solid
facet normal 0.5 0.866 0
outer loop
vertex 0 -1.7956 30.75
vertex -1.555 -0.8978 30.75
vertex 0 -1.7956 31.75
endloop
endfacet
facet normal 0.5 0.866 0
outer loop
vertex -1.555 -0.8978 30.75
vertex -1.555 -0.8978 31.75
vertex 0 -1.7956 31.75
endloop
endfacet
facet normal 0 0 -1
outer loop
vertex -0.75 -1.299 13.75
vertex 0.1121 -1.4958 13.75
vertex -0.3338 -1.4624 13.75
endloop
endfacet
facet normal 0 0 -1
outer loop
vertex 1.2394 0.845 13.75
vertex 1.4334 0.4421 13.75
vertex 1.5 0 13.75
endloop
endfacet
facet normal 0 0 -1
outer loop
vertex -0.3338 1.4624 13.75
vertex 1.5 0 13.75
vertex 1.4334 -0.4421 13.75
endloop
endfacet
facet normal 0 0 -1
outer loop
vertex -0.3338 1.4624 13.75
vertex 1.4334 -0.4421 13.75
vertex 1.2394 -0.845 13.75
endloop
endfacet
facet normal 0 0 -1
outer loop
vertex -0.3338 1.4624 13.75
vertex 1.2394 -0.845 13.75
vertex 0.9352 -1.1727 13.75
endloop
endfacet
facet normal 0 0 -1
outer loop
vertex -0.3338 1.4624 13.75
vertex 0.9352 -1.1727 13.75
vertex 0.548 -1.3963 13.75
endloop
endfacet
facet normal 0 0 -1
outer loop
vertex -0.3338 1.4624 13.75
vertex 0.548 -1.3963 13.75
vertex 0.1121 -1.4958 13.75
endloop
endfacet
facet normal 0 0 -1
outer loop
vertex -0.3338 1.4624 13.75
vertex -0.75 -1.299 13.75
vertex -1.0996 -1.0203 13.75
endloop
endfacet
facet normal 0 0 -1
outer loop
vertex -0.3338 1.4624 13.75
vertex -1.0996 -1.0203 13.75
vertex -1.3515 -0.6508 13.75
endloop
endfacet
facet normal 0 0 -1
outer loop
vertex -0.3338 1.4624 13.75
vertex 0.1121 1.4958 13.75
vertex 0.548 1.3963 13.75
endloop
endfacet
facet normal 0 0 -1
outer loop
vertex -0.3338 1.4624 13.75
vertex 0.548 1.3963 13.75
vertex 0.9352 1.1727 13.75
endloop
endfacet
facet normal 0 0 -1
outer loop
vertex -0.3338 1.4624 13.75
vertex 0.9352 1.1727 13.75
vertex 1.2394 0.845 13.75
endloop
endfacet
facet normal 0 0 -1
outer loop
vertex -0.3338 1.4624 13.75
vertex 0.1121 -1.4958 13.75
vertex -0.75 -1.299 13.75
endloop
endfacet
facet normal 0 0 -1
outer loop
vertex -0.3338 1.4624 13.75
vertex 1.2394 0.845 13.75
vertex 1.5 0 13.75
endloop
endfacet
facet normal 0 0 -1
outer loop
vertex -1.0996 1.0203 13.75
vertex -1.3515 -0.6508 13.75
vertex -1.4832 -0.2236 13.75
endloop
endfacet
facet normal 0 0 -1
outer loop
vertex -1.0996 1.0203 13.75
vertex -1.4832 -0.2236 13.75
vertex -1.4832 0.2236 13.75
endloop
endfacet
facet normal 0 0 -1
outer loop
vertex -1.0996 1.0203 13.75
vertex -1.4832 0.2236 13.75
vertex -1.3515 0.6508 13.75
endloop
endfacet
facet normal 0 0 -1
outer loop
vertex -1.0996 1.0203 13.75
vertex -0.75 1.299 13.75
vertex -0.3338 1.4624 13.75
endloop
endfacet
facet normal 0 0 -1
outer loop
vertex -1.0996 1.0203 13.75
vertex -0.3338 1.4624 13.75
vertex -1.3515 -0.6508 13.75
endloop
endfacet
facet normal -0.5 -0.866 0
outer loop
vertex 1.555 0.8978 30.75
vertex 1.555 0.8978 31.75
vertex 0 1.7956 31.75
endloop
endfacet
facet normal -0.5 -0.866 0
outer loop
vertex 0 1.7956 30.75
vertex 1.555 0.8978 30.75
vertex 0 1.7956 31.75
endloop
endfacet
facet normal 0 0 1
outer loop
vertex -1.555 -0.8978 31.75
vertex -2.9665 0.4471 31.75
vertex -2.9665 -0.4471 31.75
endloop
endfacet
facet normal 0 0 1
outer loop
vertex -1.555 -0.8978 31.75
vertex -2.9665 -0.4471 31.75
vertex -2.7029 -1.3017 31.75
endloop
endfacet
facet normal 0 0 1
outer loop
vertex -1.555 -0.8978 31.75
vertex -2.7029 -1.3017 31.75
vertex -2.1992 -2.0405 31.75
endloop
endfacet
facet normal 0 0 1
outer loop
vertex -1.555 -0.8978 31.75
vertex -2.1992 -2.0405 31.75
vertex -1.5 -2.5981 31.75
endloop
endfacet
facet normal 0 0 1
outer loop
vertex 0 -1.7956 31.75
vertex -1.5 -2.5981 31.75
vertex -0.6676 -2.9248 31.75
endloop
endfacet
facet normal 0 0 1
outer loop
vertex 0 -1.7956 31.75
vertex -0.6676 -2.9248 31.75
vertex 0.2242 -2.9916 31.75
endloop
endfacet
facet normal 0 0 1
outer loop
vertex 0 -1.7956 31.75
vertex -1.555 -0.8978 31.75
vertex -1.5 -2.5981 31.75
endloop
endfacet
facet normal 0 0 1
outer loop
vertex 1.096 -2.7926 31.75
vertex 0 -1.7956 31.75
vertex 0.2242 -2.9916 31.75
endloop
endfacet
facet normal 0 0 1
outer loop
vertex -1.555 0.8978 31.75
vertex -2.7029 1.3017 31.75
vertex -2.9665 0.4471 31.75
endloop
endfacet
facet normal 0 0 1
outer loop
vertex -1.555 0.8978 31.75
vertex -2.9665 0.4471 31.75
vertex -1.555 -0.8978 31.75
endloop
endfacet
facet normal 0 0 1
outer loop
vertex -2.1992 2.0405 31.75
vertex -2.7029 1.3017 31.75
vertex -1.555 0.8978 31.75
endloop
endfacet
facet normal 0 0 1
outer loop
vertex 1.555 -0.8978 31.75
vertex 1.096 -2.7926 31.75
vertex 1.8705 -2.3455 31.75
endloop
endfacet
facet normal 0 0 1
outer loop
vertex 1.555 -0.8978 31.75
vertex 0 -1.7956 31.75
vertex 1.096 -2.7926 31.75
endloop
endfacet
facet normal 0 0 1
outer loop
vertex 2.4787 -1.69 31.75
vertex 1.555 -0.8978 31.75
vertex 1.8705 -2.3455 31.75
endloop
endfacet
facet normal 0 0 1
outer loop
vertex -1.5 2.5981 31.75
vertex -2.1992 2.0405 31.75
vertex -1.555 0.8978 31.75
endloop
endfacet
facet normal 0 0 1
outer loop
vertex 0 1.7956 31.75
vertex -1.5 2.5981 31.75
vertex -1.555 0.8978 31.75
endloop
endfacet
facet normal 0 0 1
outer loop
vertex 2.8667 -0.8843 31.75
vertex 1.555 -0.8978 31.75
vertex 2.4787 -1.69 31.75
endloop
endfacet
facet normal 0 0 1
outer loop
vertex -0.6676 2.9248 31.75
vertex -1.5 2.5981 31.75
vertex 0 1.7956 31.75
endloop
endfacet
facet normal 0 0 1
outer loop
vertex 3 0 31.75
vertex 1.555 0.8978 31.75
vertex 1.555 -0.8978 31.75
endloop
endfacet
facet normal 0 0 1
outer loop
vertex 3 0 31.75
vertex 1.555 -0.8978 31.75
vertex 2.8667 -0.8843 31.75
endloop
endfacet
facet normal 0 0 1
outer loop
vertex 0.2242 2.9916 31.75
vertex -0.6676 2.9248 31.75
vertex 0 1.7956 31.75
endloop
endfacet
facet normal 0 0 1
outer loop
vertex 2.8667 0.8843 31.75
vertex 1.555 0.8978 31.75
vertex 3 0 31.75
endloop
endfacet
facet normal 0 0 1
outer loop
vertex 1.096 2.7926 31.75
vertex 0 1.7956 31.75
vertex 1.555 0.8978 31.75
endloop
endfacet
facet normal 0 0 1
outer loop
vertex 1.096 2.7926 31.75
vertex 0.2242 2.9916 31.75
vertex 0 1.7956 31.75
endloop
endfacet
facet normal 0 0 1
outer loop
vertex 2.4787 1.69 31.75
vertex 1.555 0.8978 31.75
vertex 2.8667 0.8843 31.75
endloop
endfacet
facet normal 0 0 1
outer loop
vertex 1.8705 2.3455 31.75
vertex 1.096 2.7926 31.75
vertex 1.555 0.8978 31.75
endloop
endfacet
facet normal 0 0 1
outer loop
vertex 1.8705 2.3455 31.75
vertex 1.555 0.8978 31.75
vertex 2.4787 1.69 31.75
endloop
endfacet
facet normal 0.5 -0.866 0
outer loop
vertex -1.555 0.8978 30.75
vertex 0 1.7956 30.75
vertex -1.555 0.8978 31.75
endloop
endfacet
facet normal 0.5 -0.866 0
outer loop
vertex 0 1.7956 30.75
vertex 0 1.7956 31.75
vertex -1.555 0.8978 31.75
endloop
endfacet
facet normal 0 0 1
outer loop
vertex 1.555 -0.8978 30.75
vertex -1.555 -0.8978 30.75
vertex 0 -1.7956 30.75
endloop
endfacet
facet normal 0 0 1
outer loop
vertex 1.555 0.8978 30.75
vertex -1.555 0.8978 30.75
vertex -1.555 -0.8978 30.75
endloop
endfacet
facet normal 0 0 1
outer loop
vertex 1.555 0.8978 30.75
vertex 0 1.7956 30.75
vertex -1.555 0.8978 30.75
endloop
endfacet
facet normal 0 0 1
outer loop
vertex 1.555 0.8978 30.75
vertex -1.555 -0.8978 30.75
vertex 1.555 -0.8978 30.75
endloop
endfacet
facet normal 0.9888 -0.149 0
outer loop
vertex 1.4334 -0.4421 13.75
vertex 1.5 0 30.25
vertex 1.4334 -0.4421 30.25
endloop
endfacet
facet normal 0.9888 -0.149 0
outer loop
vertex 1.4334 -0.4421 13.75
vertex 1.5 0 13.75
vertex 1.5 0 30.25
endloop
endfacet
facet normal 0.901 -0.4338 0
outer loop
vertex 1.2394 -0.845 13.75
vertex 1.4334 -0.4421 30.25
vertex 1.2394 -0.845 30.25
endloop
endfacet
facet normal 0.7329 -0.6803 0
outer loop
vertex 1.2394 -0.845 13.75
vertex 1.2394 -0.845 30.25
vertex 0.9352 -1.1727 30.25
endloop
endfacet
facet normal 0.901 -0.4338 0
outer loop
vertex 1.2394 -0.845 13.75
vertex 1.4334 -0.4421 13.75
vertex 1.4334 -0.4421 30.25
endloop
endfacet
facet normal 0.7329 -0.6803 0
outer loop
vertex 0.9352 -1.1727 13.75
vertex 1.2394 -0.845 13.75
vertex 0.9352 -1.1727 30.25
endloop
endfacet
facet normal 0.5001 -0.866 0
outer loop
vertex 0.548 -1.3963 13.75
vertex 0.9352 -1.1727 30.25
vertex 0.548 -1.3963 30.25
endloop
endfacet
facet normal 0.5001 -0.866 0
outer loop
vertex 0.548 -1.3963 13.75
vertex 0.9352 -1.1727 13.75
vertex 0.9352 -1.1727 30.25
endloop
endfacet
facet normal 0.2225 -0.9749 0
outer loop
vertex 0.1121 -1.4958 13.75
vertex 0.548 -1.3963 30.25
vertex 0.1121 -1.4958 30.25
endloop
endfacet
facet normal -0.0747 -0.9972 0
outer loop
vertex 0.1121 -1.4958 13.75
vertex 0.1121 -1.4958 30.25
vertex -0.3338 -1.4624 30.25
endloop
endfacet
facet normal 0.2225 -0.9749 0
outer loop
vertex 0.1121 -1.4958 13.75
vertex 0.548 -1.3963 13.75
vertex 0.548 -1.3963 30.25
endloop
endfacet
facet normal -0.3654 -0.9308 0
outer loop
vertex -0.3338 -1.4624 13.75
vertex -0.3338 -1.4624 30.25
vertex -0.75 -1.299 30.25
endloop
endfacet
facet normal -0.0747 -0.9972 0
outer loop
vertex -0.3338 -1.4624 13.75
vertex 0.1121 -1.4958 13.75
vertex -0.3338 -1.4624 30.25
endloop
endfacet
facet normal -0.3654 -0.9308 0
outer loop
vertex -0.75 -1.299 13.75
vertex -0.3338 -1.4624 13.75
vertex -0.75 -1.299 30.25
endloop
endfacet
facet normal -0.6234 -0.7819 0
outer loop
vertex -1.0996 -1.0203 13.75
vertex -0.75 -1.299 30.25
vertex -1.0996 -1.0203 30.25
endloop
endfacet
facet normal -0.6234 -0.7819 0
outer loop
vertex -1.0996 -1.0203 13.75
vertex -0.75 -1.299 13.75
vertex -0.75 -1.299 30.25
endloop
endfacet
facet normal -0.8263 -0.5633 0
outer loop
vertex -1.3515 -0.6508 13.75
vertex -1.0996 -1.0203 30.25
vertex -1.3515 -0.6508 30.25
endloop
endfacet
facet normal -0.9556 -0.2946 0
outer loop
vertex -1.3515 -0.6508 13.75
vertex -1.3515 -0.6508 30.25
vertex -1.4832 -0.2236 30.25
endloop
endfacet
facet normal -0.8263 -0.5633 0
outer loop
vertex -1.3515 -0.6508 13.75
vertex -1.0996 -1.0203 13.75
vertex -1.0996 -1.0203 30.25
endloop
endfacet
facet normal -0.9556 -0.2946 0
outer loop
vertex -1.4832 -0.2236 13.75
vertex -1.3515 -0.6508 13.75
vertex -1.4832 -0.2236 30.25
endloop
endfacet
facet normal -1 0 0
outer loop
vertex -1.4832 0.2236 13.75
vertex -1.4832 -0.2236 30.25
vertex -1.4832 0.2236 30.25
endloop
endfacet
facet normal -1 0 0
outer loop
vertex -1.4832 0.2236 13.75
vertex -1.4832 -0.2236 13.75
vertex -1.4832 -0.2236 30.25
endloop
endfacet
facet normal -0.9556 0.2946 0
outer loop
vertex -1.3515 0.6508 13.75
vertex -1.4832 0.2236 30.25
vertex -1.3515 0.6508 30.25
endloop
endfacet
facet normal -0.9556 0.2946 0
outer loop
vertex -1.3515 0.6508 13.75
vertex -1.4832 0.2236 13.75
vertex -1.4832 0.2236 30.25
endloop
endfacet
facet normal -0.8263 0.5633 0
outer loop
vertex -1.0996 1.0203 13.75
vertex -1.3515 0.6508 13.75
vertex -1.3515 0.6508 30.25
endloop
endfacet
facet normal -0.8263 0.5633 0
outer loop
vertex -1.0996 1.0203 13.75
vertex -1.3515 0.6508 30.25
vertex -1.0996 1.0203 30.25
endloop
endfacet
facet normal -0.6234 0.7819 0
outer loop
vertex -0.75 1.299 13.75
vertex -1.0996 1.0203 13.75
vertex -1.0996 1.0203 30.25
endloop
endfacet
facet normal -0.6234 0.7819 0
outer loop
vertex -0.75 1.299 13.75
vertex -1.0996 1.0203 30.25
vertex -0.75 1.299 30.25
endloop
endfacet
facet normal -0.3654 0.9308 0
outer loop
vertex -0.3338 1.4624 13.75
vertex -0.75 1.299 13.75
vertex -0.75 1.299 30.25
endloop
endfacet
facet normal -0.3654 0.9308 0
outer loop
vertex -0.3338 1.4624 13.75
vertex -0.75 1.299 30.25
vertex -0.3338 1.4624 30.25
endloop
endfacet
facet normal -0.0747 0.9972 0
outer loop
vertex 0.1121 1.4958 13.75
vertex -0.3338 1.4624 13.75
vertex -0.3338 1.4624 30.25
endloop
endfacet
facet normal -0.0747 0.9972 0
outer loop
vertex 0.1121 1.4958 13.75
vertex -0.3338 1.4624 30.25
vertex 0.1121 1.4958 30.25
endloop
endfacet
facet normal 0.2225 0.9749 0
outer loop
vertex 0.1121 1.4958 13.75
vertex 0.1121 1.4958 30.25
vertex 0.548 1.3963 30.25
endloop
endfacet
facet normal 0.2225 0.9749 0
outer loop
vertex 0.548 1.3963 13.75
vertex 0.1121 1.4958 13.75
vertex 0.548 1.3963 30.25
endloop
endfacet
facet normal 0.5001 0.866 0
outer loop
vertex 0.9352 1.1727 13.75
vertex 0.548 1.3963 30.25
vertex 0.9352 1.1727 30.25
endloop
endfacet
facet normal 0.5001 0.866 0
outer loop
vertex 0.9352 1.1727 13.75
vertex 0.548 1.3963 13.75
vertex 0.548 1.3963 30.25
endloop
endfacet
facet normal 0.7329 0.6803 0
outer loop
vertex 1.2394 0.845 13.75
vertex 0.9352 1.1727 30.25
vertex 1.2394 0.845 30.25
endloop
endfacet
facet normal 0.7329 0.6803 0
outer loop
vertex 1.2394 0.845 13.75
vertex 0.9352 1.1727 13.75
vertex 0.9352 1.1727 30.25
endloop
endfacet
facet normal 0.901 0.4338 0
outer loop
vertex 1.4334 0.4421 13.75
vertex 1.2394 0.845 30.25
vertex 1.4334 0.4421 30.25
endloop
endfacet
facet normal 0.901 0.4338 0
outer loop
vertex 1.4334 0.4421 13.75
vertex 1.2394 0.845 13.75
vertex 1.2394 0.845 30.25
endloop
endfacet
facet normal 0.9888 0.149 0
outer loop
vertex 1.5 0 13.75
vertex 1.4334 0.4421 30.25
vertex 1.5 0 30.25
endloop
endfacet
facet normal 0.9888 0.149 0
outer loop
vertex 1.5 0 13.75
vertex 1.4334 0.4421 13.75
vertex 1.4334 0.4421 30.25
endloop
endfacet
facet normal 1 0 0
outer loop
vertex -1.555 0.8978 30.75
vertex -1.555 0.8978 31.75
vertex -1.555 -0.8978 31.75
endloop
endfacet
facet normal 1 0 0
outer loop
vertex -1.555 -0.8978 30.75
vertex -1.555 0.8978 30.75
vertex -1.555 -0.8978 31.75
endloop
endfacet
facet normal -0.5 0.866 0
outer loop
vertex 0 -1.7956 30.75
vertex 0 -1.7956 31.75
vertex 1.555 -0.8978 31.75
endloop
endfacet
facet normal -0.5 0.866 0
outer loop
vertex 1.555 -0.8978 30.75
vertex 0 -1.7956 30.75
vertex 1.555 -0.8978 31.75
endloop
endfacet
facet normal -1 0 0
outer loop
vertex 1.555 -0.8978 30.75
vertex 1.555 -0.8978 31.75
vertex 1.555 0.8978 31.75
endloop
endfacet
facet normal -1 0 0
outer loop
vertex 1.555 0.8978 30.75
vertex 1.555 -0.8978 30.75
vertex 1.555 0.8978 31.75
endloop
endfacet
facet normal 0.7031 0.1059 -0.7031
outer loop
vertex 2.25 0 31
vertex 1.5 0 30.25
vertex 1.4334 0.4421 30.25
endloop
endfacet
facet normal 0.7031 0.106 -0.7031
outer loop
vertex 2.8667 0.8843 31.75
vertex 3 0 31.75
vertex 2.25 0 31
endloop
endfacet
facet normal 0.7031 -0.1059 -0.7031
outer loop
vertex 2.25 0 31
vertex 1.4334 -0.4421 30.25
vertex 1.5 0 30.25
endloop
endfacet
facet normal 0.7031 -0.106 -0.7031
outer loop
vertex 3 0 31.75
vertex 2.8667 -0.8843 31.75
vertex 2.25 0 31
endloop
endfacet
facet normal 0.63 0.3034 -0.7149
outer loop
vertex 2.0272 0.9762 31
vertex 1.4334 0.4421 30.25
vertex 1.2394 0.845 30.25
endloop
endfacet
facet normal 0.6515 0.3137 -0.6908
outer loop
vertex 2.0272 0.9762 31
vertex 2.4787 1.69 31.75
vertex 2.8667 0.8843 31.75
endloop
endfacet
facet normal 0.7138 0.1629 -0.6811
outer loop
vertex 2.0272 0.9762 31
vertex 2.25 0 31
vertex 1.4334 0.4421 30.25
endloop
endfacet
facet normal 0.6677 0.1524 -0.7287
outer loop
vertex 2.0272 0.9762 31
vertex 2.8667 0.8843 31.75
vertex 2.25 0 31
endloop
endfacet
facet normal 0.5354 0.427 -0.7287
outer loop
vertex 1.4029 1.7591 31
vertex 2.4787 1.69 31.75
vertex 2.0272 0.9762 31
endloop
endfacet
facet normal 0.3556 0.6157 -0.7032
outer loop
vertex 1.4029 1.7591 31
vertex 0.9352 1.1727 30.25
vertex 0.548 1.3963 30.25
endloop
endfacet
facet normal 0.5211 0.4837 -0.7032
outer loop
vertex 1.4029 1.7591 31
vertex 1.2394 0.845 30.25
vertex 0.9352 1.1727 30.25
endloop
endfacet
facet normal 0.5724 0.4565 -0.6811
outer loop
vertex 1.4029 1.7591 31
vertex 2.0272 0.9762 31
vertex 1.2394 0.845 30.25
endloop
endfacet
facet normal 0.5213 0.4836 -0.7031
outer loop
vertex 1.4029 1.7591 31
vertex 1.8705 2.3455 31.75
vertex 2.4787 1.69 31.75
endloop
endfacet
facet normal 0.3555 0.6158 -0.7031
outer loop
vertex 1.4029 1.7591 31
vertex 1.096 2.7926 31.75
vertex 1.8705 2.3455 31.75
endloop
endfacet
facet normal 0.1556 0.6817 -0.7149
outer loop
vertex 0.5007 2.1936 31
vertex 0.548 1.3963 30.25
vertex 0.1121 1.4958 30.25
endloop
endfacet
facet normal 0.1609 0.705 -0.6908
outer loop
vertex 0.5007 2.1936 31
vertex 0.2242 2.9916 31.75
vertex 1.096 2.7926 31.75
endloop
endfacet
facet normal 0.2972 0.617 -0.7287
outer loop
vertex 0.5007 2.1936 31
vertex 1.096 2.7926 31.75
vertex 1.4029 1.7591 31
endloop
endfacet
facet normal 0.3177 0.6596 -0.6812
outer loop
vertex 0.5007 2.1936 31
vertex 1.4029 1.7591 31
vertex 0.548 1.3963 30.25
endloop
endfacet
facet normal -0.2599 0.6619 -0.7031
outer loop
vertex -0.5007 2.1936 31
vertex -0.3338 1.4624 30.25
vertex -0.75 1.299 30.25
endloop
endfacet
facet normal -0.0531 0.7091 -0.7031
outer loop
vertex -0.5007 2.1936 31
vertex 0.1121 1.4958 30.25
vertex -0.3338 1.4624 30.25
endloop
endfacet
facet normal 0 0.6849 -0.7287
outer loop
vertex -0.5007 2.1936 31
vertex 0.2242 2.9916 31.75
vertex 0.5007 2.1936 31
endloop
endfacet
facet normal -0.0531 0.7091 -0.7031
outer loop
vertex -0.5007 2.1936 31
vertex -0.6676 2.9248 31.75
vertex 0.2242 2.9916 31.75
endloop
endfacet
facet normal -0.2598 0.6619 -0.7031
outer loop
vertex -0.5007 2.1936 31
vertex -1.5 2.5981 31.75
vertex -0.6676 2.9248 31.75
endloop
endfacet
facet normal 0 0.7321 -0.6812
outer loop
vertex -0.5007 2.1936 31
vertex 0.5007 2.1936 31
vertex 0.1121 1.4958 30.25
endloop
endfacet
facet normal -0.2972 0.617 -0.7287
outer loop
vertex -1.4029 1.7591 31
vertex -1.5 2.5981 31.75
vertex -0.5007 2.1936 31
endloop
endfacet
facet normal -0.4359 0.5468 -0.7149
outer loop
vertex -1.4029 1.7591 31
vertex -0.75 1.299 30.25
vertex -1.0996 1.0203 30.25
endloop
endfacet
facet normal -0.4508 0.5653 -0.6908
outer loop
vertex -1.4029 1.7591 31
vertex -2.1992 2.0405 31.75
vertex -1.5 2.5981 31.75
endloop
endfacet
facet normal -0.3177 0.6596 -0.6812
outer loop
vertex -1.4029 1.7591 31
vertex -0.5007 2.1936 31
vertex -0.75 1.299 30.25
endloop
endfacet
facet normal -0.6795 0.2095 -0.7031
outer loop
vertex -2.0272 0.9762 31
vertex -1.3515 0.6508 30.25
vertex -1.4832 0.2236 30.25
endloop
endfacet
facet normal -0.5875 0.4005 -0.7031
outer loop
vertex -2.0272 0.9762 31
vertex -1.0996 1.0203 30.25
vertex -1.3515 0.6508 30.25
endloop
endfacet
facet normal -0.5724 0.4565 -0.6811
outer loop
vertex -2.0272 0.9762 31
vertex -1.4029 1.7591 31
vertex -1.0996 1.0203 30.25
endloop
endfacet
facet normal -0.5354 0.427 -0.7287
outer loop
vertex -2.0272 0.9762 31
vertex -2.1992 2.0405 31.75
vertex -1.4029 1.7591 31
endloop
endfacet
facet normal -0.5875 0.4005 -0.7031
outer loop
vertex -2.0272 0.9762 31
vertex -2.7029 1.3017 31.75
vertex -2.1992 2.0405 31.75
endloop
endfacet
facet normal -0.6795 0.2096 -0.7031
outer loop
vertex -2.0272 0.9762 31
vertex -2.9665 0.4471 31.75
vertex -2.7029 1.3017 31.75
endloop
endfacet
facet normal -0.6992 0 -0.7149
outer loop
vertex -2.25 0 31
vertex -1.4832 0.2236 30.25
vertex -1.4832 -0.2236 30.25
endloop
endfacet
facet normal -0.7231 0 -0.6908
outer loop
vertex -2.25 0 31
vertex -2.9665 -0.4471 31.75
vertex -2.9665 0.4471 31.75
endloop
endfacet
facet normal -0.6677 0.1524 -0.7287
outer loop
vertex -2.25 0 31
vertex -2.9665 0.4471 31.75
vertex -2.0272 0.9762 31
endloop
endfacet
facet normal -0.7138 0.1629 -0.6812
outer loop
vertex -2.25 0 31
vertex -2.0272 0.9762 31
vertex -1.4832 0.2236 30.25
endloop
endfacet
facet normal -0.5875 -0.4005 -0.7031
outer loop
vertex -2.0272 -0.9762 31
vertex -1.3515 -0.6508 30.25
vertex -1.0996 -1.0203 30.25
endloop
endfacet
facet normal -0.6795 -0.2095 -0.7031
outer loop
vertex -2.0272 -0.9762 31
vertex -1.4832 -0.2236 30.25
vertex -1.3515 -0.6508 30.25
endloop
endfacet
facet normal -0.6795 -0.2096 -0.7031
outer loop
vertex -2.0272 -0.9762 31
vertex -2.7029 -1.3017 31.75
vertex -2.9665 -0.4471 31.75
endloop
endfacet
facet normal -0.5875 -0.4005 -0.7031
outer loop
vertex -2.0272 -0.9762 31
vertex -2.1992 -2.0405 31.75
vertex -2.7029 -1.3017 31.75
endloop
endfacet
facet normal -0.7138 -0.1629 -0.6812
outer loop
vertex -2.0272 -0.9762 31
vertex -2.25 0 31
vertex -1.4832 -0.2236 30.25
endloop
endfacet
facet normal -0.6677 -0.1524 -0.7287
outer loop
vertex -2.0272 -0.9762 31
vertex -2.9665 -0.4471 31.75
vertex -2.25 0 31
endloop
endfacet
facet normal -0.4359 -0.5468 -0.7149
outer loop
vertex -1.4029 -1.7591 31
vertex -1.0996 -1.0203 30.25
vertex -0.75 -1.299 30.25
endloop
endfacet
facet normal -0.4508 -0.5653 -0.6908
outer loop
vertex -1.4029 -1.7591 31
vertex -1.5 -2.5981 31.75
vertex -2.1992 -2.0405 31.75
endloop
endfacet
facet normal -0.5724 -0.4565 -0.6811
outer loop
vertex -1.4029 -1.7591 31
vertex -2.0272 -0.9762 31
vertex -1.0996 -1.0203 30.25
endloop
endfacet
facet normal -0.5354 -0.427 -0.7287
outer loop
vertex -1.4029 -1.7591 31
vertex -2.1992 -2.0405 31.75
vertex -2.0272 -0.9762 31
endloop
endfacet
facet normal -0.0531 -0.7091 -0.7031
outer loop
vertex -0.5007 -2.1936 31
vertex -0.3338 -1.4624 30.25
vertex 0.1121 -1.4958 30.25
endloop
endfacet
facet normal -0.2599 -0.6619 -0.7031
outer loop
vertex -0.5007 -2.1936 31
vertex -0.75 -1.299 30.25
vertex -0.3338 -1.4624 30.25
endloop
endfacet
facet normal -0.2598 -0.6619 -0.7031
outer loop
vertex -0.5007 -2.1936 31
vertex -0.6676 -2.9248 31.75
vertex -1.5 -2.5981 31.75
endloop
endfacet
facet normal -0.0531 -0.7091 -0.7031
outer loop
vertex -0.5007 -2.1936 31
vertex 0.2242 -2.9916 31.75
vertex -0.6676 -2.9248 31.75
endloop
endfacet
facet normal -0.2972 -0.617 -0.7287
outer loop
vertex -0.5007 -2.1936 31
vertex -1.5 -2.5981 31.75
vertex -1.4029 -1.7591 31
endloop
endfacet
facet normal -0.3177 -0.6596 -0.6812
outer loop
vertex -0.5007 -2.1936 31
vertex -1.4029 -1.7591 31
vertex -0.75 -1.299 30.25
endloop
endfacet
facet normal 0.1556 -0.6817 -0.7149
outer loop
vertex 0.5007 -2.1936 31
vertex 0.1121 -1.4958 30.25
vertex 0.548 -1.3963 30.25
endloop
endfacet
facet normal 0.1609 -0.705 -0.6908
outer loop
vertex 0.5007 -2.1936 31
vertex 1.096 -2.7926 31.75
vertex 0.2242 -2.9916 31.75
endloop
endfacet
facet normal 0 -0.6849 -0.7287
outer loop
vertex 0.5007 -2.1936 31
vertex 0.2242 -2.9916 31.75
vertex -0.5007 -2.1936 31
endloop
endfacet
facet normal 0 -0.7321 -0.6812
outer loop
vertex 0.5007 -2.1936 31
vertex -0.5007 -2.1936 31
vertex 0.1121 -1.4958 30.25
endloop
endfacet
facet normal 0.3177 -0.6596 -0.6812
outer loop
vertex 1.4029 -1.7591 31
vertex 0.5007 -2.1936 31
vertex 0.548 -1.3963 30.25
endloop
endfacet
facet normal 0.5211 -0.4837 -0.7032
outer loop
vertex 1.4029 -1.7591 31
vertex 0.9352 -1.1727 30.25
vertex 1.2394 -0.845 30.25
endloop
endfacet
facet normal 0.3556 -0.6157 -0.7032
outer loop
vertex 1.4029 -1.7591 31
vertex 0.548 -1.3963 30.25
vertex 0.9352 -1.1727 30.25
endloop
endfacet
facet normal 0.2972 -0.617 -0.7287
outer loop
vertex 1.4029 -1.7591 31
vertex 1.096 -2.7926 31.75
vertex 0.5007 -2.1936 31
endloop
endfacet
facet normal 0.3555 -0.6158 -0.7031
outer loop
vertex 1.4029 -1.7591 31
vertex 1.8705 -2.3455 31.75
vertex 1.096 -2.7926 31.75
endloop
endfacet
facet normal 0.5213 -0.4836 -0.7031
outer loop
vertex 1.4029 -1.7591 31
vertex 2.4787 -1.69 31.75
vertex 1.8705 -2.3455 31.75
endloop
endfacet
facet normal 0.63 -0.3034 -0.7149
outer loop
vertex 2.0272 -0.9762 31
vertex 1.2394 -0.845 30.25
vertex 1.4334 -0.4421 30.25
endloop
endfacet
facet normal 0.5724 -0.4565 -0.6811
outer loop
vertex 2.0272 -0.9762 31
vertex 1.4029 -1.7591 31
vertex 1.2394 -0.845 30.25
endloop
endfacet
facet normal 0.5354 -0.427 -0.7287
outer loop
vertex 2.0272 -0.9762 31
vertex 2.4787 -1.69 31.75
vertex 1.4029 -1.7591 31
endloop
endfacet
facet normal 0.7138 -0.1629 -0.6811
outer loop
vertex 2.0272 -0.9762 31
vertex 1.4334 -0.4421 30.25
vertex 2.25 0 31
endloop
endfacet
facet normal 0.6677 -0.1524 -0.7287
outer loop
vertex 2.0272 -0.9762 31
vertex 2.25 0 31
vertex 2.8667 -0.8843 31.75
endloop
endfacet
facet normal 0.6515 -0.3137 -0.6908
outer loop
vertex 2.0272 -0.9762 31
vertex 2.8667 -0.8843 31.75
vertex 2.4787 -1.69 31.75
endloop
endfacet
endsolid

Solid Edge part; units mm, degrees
sketch "Sketch1" plane through (0, 0, 0) normal (0, 0, 1) x (1, 0, 0)
  circle A0 centre (0, 0) radius 1.5
extrude "Protrusion1" add sketch "Sketch1" along normal blind 30
sketch "Sketch2" plane through (0, 0, 30) normal (0, 0, 1) x (1, 0, 0)
  circle A0 centre (0, 0) radius 3
extrude "ExtrudedProtrusion_2" add sketch "Sketch2" along normal blind 1.75
chamfer "Chamfer_1" distance 1.75 angle 45 1 edges at (-3, 0, 30)
sketch "Sketch3" plane through (0, 0, 31.75) normal (0, 0, 1) x (0, 1, 0)
  line L0 (0.8978, -1.555) -> (1.7956, 0)
  line L1 (1.7956, 0) -> (0.8978, 1.555)
  line L2 (0.8978, 1.555) -> (-0.8978, 1.555)
  line L3 (-0.8978, 1.555) -> (-1.7956, 0)
  line L4 (-1.7956, 0) -> (-0.8978, -1.555)
  line L5 (-0.8978, -1.555) -> (0.8978, -1.555)
extrude "ExtrudedCutout_1" cut sketch "Sketch3" against normal blind 1
sketch "Sketch4" plane through (0, 0, 0) normal (0, 0, -1) x (0, 1, 0)
  circle A0 centre (0, 0) radius 1.9215
extrude "ExtrudedCutout_2" cut sketch "Sketch4" against normal blind 13.75
properties material "Iron, grey cast type 20"
